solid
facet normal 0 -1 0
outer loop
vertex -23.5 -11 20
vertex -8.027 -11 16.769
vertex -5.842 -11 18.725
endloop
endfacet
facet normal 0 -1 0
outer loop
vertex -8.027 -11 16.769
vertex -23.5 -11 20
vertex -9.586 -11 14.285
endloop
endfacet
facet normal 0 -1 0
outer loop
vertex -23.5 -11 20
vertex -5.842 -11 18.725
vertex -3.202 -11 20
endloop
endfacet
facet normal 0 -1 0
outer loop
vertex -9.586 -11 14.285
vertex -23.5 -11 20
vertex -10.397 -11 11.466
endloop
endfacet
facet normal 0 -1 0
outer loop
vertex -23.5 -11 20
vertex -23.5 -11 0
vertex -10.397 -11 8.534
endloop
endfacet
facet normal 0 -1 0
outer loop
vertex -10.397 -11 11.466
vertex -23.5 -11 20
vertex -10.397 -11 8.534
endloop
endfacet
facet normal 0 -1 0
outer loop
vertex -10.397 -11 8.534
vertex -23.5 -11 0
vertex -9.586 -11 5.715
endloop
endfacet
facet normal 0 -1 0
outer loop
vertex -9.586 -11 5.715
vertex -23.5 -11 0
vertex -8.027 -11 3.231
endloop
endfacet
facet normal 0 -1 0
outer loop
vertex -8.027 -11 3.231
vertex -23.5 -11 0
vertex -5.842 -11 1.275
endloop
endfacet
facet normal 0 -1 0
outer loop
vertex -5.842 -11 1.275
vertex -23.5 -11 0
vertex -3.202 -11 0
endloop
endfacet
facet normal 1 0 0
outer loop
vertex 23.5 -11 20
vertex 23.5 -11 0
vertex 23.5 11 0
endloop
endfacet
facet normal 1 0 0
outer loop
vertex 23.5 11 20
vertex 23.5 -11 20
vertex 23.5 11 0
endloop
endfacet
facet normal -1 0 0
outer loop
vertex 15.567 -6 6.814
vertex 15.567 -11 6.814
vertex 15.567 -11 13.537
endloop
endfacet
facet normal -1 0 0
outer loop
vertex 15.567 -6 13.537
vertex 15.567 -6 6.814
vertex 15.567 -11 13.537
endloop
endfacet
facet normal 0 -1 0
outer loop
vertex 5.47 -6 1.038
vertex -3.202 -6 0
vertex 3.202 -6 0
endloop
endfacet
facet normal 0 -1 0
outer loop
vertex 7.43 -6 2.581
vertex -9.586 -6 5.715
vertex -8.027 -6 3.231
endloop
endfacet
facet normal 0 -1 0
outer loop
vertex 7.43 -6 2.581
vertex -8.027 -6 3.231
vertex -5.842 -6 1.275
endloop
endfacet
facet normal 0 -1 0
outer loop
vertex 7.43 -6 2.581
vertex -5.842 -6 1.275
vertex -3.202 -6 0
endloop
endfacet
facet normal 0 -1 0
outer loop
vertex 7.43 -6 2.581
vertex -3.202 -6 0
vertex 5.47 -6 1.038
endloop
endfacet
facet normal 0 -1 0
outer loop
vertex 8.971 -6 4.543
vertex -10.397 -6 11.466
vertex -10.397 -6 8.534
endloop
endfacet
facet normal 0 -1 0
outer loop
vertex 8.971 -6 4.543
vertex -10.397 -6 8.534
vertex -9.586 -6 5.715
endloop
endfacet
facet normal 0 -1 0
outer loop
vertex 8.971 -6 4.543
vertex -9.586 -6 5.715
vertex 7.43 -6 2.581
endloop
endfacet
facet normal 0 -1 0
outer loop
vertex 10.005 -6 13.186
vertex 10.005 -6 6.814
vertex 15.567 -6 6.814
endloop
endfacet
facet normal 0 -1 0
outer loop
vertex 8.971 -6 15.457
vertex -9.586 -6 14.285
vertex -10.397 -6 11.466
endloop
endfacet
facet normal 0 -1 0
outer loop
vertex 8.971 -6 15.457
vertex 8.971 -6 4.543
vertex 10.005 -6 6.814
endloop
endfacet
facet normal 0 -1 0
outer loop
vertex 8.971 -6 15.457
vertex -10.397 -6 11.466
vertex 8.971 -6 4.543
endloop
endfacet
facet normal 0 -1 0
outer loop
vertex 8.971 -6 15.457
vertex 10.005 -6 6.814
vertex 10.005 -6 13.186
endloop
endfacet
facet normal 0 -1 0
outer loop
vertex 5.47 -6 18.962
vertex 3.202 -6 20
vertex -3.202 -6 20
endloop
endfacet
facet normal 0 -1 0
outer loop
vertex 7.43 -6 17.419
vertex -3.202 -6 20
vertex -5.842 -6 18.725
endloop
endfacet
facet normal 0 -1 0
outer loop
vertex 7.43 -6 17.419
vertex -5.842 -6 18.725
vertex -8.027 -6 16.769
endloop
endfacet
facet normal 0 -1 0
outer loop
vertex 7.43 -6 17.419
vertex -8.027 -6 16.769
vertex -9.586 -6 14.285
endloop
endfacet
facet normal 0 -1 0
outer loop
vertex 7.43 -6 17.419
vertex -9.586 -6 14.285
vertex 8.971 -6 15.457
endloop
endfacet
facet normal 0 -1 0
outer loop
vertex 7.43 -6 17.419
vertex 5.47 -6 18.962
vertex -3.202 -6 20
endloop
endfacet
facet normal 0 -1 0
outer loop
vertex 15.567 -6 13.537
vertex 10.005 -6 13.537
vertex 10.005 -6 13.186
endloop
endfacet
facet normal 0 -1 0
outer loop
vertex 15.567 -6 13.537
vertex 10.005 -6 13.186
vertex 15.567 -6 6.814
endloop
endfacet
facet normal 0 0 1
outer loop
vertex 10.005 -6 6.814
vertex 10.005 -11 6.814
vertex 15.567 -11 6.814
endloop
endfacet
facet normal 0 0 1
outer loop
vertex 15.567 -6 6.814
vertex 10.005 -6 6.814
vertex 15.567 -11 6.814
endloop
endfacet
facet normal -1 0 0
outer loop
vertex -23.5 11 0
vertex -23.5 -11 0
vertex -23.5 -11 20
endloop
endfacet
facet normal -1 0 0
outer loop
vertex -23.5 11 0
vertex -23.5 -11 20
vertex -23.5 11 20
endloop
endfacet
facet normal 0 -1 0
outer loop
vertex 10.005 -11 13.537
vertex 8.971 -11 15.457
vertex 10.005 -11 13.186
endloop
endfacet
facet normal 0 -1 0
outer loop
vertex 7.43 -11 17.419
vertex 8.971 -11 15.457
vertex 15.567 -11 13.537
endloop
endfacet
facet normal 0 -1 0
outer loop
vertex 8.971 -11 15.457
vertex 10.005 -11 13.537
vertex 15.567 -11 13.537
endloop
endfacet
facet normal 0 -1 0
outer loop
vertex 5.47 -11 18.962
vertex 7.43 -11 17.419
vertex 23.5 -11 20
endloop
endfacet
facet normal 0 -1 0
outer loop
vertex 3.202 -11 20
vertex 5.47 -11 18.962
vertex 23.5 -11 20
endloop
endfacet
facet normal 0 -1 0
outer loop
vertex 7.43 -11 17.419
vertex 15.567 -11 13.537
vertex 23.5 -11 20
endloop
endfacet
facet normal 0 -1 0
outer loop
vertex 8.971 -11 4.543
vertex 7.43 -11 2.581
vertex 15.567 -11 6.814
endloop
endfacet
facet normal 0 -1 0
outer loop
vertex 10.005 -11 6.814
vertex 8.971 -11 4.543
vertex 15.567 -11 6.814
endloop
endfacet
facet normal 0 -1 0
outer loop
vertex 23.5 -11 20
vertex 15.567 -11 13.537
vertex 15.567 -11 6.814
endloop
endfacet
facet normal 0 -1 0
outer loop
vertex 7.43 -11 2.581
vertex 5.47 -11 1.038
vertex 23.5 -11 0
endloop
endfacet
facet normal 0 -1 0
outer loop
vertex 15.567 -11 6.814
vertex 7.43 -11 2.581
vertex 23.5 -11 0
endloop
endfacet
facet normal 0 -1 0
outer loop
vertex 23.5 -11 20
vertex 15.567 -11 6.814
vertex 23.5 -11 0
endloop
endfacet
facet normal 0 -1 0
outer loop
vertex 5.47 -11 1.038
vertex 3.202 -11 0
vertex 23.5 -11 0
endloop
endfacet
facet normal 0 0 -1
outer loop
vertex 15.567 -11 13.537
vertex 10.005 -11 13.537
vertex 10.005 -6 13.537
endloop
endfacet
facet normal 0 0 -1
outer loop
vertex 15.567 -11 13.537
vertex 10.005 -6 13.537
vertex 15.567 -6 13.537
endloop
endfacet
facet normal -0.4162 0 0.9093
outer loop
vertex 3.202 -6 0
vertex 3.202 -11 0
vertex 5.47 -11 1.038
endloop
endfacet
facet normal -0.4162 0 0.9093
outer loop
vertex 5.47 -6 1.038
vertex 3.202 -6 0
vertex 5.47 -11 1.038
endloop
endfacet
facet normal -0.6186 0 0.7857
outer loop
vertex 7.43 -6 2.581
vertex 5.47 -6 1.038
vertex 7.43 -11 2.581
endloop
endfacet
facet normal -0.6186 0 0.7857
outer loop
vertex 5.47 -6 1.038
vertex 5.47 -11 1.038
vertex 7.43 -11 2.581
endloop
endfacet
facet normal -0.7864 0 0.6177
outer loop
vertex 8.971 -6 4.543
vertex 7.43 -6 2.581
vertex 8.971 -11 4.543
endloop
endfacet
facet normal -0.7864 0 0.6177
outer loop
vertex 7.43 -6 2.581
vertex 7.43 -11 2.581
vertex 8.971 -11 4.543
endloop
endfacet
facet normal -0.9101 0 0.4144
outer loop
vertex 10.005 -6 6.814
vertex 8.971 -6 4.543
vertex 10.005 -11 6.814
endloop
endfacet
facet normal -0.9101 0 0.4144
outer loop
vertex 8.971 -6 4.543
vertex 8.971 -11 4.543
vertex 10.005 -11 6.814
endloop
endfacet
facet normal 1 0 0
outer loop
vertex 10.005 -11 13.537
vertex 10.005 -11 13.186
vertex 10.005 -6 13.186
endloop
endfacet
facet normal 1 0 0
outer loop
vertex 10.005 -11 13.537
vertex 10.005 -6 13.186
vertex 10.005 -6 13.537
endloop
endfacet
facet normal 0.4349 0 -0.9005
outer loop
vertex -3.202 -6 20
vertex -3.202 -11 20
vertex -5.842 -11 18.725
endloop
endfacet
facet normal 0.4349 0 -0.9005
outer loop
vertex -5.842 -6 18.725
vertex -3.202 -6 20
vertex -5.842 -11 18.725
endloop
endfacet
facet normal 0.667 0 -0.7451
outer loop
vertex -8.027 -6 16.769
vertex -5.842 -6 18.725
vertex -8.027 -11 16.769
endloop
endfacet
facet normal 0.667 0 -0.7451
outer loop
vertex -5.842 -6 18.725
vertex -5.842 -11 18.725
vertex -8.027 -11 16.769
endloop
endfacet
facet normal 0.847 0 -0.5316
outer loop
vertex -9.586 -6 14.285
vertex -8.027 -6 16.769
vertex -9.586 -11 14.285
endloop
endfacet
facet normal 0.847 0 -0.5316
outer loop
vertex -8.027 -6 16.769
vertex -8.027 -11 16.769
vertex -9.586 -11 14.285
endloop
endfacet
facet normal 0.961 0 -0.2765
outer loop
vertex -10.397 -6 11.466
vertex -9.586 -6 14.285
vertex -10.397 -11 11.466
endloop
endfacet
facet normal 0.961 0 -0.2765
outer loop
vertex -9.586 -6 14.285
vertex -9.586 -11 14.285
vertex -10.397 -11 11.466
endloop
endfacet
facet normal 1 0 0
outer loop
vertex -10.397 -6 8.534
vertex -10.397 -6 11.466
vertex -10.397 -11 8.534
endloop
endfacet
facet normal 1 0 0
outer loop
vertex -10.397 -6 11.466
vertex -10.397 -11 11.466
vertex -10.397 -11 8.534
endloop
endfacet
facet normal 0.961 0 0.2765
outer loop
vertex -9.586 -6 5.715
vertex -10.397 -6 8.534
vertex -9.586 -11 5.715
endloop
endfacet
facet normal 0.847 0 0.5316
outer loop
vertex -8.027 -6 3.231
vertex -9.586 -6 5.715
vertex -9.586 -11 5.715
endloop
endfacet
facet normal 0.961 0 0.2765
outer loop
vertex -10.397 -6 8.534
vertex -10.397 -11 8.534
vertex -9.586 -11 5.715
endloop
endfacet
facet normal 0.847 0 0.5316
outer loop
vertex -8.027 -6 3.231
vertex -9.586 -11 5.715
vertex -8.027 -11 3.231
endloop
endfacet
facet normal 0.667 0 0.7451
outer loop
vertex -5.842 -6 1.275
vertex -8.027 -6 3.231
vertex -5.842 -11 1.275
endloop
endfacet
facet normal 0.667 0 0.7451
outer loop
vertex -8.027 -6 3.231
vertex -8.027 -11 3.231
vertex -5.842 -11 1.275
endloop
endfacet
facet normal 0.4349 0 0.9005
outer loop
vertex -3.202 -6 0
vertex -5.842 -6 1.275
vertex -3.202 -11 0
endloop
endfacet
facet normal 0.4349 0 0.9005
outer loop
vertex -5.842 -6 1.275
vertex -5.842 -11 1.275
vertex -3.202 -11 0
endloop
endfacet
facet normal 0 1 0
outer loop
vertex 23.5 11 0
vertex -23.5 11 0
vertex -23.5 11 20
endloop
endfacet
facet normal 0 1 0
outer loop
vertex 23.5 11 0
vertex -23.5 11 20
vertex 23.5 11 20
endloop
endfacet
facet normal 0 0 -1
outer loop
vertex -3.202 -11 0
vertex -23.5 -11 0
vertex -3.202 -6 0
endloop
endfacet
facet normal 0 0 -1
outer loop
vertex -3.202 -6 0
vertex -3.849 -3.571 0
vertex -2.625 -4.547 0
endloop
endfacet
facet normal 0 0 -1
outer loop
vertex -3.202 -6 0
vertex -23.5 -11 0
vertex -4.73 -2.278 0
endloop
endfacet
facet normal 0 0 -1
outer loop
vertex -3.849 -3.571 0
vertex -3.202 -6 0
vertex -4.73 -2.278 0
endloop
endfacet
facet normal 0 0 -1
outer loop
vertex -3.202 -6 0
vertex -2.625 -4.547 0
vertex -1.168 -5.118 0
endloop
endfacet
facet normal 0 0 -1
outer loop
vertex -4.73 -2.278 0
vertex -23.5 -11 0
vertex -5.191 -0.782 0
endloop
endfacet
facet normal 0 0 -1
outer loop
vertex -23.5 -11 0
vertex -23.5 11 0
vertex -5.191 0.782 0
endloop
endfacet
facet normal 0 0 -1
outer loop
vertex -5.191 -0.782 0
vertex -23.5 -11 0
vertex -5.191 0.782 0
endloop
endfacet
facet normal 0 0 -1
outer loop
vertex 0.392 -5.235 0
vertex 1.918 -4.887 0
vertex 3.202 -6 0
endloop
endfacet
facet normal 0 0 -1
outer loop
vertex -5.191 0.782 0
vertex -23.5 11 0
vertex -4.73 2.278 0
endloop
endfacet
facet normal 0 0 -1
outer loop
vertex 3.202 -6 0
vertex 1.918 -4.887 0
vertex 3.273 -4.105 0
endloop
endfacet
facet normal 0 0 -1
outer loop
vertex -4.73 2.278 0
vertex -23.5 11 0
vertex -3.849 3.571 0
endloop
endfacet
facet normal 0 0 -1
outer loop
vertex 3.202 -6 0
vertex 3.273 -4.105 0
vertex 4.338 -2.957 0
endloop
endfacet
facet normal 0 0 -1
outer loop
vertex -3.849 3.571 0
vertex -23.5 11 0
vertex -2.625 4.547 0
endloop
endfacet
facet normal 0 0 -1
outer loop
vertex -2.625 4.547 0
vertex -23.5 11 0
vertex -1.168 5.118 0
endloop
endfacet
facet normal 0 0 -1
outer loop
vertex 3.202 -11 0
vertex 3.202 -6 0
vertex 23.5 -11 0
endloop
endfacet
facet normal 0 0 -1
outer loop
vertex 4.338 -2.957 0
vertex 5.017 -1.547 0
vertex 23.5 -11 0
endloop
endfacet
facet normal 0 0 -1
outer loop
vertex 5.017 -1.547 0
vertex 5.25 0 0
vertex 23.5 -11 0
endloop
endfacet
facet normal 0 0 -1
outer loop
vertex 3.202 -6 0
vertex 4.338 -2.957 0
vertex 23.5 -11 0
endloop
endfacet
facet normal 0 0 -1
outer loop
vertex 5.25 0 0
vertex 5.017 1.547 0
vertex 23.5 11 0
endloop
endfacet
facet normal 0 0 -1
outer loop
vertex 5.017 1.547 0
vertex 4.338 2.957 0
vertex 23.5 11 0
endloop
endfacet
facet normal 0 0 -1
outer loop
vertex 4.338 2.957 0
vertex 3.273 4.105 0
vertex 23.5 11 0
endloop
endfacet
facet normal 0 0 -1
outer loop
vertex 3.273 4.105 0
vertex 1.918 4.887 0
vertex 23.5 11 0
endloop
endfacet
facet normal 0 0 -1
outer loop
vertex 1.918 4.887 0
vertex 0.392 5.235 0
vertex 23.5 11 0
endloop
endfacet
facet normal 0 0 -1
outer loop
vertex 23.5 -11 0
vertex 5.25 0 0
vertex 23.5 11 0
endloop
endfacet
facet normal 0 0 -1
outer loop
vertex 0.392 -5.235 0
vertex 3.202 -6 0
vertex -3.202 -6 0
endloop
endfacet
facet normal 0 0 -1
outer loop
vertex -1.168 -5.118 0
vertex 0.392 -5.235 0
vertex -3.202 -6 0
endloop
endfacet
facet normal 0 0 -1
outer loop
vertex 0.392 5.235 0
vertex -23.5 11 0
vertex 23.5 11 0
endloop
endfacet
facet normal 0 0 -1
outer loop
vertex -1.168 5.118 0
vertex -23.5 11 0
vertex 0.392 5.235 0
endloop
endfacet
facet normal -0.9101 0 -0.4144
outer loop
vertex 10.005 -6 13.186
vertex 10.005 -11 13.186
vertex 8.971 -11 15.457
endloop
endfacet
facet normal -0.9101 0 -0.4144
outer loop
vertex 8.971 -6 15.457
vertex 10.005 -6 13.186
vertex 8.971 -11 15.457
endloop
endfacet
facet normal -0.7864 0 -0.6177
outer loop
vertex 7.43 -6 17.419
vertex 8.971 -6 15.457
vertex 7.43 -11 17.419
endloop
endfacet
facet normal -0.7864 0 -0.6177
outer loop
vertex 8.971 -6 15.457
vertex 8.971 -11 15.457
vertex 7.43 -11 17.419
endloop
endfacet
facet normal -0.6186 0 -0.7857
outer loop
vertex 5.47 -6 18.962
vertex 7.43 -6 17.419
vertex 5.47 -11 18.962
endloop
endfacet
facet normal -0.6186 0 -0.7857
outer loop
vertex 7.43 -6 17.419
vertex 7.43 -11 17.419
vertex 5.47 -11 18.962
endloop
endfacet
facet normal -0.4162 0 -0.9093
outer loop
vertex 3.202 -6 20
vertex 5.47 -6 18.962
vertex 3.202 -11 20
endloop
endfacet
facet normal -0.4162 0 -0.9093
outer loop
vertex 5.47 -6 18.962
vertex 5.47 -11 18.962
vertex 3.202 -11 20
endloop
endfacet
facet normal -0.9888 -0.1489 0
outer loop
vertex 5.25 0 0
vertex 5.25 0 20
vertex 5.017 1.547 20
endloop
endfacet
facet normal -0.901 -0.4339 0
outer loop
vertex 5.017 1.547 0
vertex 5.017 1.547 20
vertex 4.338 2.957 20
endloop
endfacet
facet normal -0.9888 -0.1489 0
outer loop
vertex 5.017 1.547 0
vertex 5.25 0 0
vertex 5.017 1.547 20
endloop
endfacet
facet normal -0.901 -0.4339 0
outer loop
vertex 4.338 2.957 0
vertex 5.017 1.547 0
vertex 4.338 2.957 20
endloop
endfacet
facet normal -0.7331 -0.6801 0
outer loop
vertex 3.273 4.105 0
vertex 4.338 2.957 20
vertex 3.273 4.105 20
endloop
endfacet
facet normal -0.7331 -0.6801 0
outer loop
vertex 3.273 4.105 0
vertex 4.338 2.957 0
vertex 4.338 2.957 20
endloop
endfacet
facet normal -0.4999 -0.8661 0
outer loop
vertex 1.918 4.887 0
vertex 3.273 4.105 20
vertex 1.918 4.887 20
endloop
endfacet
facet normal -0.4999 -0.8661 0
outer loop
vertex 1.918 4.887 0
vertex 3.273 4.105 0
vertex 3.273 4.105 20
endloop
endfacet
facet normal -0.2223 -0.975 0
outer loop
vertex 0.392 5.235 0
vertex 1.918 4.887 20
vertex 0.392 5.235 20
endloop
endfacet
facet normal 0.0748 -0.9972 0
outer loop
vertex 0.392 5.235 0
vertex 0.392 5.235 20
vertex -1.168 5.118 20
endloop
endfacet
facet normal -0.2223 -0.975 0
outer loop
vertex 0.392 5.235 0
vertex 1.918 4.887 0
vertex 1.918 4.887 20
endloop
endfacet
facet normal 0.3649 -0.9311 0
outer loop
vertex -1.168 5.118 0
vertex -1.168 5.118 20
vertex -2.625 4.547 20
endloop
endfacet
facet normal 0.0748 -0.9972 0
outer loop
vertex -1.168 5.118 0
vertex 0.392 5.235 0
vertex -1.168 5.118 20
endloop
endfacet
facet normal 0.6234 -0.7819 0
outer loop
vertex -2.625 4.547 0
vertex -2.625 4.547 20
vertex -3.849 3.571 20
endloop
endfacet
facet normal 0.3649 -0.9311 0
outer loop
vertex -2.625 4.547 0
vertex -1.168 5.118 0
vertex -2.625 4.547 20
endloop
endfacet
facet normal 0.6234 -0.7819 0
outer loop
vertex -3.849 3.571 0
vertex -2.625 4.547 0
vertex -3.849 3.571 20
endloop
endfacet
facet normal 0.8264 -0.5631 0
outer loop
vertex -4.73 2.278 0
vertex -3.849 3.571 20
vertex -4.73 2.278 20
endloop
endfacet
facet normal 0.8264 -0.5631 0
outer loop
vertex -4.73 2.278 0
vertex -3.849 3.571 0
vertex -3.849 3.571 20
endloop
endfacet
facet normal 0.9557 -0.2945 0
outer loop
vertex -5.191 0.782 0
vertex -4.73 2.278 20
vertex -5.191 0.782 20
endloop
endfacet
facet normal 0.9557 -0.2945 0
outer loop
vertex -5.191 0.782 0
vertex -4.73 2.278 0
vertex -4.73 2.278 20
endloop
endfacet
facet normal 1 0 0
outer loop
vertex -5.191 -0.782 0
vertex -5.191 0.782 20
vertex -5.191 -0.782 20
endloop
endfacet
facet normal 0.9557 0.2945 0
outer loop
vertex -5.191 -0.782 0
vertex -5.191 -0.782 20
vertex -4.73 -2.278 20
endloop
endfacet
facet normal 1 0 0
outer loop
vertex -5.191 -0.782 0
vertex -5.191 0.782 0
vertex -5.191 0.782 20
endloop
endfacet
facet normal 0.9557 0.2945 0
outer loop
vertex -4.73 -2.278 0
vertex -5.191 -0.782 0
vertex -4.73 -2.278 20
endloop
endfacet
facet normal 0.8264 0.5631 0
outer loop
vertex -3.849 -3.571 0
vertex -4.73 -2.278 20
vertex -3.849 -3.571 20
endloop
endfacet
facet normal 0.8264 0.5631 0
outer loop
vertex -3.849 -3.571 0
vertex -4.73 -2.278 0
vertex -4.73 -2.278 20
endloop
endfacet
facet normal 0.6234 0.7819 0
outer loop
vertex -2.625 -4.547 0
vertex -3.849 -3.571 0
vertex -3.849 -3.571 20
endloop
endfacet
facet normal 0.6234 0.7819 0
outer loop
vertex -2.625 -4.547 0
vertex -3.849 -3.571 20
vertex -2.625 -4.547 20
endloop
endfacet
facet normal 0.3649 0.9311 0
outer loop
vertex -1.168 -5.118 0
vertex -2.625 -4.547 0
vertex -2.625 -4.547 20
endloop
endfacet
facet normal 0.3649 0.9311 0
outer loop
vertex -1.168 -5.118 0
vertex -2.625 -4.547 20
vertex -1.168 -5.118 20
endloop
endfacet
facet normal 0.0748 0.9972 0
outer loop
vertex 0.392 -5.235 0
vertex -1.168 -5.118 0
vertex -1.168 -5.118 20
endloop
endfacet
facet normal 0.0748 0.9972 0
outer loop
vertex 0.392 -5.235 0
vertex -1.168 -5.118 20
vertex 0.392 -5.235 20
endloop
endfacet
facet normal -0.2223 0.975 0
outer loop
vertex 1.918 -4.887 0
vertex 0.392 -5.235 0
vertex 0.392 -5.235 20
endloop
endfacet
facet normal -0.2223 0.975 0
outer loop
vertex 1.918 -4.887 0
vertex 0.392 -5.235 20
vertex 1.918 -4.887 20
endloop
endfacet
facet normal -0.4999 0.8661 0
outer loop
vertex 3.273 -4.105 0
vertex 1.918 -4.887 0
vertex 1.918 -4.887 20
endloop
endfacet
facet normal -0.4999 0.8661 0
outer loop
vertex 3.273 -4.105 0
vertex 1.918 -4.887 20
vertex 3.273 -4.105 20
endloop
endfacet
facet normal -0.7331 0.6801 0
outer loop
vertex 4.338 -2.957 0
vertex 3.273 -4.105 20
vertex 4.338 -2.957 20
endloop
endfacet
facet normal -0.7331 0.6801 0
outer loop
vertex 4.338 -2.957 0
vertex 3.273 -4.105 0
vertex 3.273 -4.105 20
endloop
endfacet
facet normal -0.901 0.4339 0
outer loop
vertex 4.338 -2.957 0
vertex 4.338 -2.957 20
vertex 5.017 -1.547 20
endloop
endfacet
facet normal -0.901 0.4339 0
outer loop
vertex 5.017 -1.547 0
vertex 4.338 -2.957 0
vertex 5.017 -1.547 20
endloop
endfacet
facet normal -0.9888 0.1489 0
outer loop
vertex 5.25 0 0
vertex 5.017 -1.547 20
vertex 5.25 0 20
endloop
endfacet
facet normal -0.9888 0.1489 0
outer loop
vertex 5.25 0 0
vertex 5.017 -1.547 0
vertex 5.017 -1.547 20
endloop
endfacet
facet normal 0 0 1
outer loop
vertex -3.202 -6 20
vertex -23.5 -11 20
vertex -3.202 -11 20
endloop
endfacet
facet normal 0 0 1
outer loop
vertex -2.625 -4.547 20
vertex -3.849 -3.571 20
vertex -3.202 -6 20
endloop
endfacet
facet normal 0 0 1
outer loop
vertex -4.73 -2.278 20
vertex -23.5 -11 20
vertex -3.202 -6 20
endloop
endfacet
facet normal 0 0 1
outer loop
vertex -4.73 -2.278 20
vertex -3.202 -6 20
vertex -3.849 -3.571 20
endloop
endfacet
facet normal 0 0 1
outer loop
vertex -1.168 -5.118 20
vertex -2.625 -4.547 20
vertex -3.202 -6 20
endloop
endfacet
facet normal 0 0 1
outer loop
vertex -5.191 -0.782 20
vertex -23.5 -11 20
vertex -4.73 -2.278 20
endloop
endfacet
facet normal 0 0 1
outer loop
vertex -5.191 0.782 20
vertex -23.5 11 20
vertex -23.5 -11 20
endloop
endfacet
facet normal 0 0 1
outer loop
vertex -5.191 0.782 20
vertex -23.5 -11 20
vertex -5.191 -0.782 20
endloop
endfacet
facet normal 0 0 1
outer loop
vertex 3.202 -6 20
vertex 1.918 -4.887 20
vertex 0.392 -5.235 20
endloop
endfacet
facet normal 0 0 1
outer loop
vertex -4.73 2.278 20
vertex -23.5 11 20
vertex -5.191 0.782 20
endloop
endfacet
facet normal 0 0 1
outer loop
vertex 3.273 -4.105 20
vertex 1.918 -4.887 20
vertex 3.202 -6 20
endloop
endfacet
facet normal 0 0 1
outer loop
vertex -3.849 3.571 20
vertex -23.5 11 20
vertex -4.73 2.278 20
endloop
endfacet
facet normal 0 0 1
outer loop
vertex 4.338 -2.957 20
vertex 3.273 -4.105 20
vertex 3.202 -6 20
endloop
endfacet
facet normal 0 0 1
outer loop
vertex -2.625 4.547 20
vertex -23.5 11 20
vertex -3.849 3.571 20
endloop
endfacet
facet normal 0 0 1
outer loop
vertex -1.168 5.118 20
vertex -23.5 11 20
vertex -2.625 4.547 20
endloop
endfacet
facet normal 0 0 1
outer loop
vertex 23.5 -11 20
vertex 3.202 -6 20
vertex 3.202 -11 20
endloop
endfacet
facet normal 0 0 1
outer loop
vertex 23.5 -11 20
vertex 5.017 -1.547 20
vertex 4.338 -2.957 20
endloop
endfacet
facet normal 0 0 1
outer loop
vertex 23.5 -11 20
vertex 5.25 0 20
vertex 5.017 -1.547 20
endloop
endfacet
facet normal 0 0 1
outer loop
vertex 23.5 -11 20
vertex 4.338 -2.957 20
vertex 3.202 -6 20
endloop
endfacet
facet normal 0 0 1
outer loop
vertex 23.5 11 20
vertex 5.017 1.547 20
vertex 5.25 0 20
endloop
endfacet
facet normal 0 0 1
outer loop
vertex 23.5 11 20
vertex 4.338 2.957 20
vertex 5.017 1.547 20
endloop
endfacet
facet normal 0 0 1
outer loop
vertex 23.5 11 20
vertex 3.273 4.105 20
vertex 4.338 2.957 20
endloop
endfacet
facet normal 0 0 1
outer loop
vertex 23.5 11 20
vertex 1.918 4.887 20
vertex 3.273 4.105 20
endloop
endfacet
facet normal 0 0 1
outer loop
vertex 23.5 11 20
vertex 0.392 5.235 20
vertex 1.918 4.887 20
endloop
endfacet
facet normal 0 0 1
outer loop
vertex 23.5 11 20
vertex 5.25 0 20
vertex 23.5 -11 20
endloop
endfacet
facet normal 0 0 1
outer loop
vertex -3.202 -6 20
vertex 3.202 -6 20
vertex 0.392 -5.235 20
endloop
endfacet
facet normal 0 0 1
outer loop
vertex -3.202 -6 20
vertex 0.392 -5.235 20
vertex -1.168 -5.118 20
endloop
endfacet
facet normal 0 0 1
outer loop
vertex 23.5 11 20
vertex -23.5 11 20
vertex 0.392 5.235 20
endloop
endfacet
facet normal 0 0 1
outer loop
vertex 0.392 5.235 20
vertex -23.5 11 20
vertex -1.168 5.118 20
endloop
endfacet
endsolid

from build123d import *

# Parameters (mm, degrees)
SKETCH1_W           = 47
SKETCH1_H           = 22
SKETCH1_R           = 5.25
BOSS_EXTRUDE1_DEPTH = 20
SKETCH2_R           = 10.5
SKETCH2_W           = 5.562030484
SKETCH2_H           = 6.723730134
CUT_EXTRUDE1_DEPTH  = 5


with BuildPart() as part:
    # Sketch1 → Boss-Extrude1 (new body)
    with BuildSketch(Plane.XY):
        Rectangle(SKETCH1_W, SKETCH1_H)
        Circle(SKETCH1_R, mode=Mode.SUBTRACT)
    extrude(amount=BOSS_EXTRUDE1_DEPTH)

    # Sketch2 → Cut-Extrude1 (cut)
    with BuildSketch(Plane.XZ.offset(11)):
        with BuildLine():
            ThreePointArc((3.201562119, 0), (7.43030884, 2.581070796), (10.004895252, 6.813768529))
            Line((10.004895252, 6.813768529), (10.004895252, 13.186231471))
            ThreePointArc((10.004895252, 13.186231471), (7.43030884, 17.418929204), (3.201562119, 20))
            Line((3.201562119, 20), (-3.201562119, 20))
            ThreePointArc((-3.201562119, 20), (-10.5, 10), (-3.201562119, 0))
            Line((-3.201562119, 0), (3.201562119, 0))
        make_face()
        with Locations((0, 10)):
            Circle(SKETCH2_R)
        with Locations((12.785910494, 10.175633596)):
            Rectangle(SKETCH2_W, SKETCH2_H)
        with BuildLine():
            Line((10.004895252, 13.186231471), (10.004895252, 6.813768529))
            ThreePointArc((10.004895252, 6.813768529), (10.375485534, 8.387765549), (10.5, 10))
            ThreePointArc((10.5, 10), (10.375485534, 11.612234451), (10.004895252, 13.186231471))
        make_face()
    extrude(amount=-CUT_EXTRUDE1_DEPTH, mode=Mode.SUBTRACT)


solid = part.part
